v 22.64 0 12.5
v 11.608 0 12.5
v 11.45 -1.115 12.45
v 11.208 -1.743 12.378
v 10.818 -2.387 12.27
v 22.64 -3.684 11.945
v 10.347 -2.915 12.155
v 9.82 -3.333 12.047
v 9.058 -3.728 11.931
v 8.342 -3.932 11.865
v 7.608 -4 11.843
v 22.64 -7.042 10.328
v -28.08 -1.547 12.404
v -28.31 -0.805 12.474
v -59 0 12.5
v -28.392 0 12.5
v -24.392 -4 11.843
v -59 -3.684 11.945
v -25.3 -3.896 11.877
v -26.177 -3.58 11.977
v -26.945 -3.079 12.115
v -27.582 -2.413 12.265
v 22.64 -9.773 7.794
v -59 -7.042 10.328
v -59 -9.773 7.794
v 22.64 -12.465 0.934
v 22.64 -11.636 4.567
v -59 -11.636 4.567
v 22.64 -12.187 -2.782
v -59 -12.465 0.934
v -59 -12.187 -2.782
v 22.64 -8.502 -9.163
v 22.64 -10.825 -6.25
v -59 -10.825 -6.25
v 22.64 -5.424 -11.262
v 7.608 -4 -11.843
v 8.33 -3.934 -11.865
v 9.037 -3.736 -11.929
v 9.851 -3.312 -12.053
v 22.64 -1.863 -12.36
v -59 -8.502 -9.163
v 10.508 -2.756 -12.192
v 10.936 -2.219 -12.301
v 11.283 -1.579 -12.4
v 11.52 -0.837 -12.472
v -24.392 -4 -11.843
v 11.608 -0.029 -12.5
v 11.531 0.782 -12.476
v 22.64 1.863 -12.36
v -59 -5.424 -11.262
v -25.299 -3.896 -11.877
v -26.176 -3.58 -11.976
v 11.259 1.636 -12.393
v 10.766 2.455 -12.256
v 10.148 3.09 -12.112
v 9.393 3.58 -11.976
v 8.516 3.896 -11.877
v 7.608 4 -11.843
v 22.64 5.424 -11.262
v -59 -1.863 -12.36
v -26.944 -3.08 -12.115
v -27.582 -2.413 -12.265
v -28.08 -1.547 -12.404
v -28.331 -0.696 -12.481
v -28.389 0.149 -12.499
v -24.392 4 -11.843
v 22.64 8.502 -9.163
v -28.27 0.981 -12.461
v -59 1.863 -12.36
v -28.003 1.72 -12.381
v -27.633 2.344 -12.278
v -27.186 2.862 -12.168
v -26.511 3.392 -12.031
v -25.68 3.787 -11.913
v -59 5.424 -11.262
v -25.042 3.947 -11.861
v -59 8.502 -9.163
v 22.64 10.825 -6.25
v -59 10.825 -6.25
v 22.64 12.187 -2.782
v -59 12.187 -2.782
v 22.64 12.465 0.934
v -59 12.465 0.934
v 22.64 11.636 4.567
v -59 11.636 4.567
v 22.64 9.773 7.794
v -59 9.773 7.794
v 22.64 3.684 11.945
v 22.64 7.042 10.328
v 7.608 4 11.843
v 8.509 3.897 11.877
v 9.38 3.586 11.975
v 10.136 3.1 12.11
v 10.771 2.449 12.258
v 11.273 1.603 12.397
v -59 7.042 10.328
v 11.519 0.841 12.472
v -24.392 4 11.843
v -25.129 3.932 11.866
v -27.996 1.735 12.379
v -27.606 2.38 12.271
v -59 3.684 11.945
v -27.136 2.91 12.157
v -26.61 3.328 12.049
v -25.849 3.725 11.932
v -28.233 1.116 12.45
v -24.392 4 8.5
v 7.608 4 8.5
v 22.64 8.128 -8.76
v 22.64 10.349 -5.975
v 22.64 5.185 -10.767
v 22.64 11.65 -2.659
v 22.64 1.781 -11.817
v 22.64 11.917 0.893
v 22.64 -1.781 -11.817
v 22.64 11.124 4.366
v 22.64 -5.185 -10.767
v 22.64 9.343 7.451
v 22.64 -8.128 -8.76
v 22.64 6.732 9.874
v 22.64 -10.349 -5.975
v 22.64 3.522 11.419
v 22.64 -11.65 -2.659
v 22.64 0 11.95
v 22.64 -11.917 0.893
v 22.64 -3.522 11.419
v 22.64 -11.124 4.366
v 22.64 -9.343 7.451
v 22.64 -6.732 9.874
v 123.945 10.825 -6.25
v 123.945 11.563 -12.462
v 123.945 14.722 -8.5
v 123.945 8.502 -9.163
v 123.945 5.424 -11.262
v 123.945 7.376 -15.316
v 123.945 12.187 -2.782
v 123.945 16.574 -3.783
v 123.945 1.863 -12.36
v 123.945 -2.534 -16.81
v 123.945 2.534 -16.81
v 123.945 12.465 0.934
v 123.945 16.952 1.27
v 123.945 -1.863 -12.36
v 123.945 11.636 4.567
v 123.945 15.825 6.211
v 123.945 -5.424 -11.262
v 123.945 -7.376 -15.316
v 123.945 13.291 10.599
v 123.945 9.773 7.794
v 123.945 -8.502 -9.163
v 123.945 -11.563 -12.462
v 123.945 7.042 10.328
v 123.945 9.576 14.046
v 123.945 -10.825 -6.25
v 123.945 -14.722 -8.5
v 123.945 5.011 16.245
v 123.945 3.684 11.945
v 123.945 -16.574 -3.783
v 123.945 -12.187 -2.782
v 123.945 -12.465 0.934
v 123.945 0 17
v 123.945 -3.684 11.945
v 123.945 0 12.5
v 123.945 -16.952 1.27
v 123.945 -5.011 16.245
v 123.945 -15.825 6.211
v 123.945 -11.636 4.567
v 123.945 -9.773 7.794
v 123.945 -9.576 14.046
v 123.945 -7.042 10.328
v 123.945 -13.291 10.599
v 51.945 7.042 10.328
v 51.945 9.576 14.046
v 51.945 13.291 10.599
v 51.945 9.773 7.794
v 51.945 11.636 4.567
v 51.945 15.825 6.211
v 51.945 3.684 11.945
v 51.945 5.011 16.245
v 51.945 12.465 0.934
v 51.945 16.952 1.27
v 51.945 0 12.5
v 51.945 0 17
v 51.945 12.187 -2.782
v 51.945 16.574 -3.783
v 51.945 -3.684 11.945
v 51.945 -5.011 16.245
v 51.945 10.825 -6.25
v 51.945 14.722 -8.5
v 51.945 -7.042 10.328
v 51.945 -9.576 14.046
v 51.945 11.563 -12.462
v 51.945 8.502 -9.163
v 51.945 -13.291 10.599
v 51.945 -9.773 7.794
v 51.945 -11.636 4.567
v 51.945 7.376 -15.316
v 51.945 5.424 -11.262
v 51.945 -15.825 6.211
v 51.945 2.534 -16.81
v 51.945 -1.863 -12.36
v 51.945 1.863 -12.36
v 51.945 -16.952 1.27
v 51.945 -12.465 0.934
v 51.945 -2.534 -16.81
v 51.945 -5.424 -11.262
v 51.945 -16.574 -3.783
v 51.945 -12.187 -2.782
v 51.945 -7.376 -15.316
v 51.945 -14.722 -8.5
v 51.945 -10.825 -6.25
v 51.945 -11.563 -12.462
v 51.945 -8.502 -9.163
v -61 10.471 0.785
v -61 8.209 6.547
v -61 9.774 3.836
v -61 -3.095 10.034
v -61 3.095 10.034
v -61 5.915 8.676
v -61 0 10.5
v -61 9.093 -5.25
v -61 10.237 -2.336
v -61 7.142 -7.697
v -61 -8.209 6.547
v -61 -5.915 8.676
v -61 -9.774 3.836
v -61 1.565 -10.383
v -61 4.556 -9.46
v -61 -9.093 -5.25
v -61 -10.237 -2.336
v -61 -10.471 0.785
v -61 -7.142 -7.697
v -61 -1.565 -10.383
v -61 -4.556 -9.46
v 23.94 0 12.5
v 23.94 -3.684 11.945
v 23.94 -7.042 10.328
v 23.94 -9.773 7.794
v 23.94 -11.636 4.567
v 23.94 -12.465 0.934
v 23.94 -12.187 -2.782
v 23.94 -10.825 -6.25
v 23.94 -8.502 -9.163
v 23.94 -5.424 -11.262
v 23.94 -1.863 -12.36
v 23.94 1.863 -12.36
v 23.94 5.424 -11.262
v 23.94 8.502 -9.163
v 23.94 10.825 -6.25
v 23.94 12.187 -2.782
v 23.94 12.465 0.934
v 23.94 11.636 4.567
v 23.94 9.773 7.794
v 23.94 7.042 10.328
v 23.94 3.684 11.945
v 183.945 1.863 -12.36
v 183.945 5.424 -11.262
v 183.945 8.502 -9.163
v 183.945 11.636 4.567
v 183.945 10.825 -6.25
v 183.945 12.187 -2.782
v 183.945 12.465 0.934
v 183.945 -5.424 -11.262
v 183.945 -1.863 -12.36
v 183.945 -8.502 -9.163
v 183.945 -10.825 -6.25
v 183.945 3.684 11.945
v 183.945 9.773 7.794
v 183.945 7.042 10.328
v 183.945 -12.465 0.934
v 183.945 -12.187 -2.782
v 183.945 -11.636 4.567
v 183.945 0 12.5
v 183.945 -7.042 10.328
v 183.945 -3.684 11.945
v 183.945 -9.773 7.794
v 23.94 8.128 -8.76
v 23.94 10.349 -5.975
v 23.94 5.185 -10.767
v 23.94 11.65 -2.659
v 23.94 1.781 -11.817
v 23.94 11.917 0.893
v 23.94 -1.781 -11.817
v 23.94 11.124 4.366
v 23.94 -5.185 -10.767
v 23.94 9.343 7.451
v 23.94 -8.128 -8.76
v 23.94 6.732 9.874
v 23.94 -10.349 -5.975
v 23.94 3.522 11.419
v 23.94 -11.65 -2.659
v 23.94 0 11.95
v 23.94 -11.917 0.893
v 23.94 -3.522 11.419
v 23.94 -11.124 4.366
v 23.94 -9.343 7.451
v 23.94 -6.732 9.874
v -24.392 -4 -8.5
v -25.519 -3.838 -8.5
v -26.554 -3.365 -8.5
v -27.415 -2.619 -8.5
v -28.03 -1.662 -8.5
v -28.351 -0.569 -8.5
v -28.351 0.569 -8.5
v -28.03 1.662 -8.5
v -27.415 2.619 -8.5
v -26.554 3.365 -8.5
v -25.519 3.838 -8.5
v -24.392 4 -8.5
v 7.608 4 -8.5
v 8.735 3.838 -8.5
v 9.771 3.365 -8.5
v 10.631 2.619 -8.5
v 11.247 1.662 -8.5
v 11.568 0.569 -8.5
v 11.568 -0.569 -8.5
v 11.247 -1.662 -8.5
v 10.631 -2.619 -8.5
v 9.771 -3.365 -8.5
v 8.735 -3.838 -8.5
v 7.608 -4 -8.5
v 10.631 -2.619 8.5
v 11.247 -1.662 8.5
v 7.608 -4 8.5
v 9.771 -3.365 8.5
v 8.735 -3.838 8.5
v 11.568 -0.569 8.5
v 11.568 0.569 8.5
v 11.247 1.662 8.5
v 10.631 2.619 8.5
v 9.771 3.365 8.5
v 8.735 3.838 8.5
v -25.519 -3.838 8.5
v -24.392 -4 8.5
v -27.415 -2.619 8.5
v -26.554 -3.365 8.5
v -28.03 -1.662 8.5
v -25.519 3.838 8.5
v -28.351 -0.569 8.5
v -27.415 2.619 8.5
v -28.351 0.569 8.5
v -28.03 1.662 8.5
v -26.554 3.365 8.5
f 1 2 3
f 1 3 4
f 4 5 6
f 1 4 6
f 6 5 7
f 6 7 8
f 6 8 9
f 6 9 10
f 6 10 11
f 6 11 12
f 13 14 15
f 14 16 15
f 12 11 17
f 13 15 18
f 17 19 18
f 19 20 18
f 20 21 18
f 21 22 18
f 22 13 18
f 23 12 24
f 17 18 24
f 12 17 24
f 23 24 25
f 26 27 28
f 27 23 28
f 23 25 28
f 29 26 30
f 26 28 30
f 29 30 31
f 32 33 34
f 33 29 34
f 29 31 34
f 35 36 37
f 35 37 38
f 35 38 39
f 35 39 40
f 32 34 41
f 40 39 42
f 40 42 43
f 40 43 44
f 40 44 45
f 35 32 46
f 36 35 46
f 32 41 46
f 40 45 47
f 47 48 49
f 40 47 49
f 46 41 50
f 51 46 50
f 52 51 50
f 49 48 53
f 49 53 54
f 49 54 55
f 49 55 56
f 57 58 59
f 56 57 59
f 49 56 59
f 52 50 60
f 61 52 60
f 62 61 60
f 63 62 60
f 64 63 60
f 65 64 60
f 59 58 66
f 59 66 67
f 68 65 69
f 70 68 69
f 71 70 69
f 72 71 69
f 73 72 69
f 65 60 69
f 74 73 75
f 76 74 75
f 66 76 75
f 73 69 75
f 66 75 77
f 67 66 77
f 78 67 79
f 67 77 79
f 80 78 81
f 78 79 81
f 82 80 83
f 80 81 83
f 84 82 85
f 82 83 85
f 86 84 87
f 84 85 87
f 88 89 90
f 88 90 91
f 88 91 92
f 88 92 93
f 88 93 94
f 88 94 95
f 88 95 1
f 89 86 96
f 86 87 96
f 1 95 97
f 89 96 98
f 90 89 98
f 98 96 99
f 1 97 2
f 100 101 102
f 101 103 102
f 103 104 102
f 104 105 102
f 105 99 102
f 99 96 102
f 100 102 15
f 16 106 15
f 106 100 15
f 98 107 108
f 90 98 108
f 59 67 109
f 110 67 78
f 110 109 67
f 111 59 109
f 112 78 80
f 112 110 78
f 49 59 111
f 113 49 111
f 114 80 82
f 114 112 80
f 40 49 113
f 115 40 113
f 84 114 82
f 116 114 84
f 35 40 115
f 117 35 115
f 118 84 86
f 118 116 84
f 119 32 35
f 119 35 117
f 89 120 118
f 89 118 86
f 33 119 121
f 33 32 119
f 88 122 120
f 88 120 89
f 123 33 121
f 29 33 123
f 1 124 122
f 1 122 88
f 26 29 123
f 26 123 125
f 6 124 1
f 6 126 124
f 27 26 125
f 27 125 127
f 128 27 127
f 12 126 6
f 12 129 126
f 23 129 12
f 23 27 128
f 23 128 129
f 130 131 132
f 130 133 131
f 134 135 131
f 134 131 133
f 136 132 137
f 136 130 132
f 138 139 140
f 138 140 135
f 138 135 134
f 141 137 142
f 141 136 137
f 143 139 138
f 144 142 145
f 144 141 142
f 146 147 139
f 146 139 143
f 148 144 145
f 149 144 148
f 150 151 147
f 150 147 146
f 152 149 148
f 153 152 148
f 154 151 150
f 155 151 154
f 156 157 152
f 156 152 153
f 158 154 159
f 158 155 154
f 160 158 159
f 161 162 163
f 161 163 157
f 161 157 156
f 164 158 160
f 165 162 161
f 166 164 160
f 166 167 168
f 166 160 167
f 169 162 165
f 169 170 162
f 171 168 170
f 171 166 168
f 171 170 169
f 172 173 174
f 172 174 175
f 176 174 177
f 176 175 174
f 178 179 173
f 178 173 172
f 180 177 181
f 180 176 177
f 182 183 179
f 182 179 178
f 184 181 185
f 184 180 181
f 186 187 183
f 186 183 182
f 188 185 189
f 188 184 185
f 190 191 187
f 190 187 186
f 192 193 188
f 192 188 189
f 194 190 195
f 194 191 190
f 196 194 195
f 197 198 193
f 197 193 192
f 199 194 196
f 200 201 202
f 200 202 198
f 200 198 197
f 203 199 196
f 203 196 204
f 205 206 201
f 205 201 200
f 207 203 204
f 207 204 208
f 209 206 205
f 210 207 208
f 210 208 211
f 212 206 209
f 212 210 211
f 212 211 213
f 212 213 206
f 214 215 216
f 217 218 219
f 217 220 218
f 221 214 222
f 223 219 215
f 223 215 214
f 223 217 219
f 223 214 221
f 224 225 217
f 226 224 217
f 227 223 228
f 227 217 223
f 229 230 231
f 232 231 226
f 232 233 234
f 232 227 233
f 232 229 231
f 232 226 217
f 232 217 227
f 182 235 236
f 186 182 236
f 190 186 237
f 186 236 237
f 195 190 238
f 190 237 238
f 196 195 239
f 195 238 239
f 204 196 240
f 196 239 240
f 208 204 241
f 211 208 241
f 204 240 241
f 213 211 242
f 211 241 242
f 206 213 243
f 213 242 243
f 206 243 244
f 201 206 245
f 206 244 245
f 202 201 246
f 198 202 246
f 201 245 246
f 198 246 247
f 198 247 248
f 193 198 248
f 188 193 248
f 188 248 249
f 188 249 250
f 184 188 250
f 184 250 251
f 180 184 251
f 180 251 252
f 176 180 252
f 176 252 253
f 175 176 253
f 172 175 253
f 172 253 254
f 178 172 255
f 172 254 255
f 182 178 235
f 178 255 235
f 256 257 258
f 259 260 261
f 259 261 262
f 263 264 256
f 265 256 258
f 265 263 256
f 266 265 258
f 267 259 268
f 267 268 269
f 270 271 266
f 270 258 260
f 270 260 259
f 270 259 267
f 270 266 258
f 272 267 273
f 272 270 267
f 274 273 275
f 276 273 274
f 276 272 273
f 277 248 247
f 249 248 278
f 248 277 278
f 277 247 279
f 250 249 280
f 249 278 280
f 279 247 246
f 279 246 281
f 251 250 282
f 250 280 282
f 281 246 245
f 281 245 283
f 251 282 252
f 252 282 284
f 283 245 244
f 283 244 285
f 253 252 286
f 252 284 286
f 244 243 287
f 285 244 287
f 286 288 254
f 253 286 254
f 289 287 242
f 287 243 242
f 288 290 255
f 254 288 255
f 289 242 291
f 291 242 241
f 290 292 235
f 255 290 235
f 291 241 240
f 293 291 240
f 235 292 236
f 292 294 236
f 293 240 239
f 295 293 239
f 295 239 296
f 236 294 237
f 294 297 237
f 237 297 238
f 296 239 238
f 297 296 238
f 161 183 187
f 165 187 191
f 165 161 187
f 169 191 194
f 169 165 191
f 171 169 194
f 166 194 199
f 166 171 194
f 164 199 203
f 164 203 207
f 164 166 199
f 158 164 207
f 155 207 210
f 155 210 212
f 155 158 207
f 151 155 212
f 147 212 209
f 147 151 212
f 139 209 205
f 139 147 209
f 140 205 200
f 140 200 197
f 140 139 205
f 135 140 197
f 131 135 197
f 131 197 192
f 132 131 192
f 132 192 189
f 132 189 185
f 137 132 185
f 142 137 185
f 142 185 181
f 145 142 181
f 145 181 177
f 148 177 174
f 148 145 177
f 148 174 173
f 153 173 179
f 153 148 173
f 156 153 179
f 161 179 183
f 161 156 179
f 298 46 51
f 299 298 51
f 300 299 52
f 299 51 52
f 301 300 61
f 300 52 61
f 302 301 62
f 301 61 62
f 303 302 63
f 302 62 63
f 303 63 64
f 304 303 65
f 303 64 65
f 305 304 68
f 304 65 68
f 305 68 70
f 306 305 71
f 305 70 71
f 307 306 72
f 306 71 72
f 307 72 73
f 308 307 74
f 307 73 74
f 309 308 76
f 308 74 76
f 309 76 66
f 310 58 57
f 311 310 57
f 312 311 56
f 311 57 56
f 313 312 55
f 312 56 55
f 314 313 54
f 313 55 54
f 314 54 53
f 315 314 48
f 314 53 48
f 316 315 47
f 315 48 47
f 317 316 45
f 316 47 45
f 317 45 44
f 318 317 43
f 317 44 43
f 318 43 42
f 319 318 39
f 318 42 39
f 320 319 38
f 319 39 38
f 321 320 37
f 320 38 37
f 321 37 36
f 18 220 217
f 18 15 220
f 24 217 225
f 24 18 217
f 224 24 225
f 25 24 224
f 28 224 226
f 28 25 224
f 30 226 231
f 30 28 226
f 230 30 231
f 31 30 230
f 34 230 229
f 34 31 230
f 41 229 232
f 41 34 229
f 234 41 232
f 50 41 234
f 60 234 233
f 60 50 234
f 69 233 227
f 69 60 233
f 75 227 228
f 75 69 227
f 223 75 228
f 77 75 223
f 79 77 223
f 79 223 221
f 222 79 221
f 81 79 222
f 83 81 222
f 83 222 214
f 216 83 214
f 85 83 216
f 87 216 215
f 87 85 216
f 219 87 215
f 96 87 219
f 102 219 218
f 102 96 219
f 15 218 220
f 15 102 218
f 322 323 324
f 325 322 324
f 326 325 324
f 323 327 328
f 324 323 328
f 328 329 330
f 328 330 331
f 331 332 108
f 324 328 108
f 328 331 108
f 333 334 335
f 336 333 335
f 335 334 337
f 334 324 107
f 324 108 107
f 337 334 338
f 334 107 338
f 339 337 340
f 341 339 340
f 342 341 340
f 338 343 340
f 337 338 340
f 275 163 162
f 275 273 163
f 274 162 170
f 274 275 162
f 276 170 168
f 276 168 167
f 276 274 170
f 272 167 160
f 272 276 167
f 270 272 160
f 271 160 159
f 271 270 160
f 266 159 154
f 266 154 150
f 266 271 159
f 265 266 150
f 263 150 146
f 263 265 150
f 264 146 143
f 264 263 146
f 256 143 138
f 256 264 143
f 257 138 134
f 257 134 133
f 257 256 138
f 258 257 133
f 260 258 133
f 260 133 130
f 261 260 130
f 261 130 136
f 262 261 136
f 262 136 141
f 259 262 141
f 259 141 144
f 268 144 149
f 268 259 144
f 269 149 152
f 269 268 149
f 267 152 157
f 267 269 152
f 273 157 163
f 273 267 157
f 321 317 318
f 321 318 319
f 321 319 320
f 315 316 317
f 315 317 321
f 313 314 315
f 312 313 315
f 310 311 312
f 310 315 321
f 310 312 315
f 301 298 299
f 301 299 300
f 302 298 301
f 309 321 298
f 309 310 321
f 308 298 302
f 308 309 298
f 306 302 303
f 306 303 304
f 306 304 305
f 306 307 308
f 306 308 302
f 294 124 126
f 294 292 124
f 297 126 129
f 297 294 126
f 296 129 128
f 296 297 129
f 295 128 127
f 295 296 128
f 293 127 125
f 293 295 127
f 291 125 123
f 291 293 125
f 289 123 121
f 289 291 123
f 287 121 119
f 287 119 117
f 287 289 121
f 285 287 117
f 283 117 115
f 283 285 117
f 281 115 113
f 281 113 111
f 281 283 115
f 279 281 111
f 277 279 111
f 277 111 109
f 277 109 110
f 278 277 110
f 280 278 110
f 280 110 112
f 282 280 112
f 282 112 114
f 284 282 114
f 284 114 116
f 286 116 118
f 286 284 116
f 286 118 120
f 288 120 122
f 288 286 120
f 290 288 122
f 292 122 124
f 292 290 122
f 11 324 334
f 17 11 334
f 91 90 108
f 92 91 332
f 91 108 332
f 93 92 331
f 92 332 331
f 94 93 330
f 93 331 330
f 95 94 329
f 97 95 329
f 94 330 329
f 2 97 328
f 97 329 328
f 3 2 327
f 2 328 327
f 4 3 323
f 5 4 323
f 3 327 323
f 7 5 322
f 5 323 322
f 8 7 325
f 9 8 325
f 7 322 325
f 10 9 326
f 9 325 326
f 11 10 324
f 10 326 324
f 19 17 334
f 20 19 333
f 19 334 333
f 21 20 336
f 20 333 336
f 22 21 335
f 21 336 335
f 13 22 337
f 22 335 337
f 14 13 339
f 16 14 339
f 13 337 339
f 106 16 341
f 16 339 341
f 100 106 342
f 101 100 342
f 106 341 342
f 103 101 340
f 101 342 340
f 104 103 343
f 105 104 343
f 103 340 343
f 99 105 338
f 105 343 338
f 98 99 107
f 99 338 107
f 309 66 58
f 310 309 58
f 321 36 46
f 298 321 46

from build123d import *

# Parameters (mm, degrees)
IZIM2_W               = 1.3
IZIM2_H               = 1.828643919
KES_EKSTR_ZYON1_START = 8.5
KES_EKSTR_ZYON1_DEPTH = 10
KES_EKSTR_ZYON2_START = -18.5
KES_EKSTR_ZYON2_DEPTH = 10


with BuildPart() as part:
    # Çizim1 → Döndür1 (revolve)
    with BuildSketch(Plane.XY):
        Polygon((0, 0), (-61, 0), (-61, 10.5), (-59, 12.5), (1.944879757, 12.5), (51.944879757, 12.5), (51.944879757, 17), (123.944879757, 17), (123.944879757, 12.5), (183.944879757, 12.5), (183.944879757, 0), (123.944879757, 0), align=None)
    revolve(axis=Axis((0, 0, 0), (1, 0, 0)))

    # Çizim2 → Kes-Döndür1 (revolve, cut)
    with BuildSketch(Plane(origin=(0, 0, 0), x_dir=(1, 0, 0), z_dir=(0, 1, 0))):
        with Locations((23.29, -12.864321959)):
            Rectangle(IZIM2_W, IZIM2_H)
    revolve(axis=Axis((0, 0, 0), (1, 0, 0)), mode=Mode.SUBTRACT)

    # Çizim3 → Kes-Ekstrüzyon1 (cut)
    with BuildSketch(Plane.XY.offset(KES_EKSTR_ZYON1_START)):
        with BuildLine():
            Line((-24.391699554, 4), (7.608300446, 4))
            ThreePointArc((7.608300446, 4), (11.608300446, 0), (7.608300446, -4))
            Line((7.608300446, -4), (-24.391699554, -4))
            ThreePointArc((-24.391699554, -4), (-28.391699554, 0), (-24.391699554, 4))
        make_face()
    extrude(amount=KES_EKSTR_ZYON1_DEPTH, mode=Mode.SUBTRACT)

    # Çizim3<2> → Kes-Ekstrüzyon2 (cut)
    with BuildSketch(Plane.XY.offset(KES_EKSTR_ZYON2_START)):
        with BuildLine():
            Line((-24.391699554, 4), (7.608300446, 4))
            ThreePointArc((7.608300446, 4), (11.608300446, 0), (7.608300446, -4))
            Line((7.608300446, -4), (-24.391699554, -4))
            ThreePointArc((-24.391699554, -4), (-28.391699554, 0), (-24.391699554, 4))
        make_face()
    extrude(amount=KES_EKSTR_ZYON2_DEPTH, mode=Mode.SUBTRACT)


solid = part.part
